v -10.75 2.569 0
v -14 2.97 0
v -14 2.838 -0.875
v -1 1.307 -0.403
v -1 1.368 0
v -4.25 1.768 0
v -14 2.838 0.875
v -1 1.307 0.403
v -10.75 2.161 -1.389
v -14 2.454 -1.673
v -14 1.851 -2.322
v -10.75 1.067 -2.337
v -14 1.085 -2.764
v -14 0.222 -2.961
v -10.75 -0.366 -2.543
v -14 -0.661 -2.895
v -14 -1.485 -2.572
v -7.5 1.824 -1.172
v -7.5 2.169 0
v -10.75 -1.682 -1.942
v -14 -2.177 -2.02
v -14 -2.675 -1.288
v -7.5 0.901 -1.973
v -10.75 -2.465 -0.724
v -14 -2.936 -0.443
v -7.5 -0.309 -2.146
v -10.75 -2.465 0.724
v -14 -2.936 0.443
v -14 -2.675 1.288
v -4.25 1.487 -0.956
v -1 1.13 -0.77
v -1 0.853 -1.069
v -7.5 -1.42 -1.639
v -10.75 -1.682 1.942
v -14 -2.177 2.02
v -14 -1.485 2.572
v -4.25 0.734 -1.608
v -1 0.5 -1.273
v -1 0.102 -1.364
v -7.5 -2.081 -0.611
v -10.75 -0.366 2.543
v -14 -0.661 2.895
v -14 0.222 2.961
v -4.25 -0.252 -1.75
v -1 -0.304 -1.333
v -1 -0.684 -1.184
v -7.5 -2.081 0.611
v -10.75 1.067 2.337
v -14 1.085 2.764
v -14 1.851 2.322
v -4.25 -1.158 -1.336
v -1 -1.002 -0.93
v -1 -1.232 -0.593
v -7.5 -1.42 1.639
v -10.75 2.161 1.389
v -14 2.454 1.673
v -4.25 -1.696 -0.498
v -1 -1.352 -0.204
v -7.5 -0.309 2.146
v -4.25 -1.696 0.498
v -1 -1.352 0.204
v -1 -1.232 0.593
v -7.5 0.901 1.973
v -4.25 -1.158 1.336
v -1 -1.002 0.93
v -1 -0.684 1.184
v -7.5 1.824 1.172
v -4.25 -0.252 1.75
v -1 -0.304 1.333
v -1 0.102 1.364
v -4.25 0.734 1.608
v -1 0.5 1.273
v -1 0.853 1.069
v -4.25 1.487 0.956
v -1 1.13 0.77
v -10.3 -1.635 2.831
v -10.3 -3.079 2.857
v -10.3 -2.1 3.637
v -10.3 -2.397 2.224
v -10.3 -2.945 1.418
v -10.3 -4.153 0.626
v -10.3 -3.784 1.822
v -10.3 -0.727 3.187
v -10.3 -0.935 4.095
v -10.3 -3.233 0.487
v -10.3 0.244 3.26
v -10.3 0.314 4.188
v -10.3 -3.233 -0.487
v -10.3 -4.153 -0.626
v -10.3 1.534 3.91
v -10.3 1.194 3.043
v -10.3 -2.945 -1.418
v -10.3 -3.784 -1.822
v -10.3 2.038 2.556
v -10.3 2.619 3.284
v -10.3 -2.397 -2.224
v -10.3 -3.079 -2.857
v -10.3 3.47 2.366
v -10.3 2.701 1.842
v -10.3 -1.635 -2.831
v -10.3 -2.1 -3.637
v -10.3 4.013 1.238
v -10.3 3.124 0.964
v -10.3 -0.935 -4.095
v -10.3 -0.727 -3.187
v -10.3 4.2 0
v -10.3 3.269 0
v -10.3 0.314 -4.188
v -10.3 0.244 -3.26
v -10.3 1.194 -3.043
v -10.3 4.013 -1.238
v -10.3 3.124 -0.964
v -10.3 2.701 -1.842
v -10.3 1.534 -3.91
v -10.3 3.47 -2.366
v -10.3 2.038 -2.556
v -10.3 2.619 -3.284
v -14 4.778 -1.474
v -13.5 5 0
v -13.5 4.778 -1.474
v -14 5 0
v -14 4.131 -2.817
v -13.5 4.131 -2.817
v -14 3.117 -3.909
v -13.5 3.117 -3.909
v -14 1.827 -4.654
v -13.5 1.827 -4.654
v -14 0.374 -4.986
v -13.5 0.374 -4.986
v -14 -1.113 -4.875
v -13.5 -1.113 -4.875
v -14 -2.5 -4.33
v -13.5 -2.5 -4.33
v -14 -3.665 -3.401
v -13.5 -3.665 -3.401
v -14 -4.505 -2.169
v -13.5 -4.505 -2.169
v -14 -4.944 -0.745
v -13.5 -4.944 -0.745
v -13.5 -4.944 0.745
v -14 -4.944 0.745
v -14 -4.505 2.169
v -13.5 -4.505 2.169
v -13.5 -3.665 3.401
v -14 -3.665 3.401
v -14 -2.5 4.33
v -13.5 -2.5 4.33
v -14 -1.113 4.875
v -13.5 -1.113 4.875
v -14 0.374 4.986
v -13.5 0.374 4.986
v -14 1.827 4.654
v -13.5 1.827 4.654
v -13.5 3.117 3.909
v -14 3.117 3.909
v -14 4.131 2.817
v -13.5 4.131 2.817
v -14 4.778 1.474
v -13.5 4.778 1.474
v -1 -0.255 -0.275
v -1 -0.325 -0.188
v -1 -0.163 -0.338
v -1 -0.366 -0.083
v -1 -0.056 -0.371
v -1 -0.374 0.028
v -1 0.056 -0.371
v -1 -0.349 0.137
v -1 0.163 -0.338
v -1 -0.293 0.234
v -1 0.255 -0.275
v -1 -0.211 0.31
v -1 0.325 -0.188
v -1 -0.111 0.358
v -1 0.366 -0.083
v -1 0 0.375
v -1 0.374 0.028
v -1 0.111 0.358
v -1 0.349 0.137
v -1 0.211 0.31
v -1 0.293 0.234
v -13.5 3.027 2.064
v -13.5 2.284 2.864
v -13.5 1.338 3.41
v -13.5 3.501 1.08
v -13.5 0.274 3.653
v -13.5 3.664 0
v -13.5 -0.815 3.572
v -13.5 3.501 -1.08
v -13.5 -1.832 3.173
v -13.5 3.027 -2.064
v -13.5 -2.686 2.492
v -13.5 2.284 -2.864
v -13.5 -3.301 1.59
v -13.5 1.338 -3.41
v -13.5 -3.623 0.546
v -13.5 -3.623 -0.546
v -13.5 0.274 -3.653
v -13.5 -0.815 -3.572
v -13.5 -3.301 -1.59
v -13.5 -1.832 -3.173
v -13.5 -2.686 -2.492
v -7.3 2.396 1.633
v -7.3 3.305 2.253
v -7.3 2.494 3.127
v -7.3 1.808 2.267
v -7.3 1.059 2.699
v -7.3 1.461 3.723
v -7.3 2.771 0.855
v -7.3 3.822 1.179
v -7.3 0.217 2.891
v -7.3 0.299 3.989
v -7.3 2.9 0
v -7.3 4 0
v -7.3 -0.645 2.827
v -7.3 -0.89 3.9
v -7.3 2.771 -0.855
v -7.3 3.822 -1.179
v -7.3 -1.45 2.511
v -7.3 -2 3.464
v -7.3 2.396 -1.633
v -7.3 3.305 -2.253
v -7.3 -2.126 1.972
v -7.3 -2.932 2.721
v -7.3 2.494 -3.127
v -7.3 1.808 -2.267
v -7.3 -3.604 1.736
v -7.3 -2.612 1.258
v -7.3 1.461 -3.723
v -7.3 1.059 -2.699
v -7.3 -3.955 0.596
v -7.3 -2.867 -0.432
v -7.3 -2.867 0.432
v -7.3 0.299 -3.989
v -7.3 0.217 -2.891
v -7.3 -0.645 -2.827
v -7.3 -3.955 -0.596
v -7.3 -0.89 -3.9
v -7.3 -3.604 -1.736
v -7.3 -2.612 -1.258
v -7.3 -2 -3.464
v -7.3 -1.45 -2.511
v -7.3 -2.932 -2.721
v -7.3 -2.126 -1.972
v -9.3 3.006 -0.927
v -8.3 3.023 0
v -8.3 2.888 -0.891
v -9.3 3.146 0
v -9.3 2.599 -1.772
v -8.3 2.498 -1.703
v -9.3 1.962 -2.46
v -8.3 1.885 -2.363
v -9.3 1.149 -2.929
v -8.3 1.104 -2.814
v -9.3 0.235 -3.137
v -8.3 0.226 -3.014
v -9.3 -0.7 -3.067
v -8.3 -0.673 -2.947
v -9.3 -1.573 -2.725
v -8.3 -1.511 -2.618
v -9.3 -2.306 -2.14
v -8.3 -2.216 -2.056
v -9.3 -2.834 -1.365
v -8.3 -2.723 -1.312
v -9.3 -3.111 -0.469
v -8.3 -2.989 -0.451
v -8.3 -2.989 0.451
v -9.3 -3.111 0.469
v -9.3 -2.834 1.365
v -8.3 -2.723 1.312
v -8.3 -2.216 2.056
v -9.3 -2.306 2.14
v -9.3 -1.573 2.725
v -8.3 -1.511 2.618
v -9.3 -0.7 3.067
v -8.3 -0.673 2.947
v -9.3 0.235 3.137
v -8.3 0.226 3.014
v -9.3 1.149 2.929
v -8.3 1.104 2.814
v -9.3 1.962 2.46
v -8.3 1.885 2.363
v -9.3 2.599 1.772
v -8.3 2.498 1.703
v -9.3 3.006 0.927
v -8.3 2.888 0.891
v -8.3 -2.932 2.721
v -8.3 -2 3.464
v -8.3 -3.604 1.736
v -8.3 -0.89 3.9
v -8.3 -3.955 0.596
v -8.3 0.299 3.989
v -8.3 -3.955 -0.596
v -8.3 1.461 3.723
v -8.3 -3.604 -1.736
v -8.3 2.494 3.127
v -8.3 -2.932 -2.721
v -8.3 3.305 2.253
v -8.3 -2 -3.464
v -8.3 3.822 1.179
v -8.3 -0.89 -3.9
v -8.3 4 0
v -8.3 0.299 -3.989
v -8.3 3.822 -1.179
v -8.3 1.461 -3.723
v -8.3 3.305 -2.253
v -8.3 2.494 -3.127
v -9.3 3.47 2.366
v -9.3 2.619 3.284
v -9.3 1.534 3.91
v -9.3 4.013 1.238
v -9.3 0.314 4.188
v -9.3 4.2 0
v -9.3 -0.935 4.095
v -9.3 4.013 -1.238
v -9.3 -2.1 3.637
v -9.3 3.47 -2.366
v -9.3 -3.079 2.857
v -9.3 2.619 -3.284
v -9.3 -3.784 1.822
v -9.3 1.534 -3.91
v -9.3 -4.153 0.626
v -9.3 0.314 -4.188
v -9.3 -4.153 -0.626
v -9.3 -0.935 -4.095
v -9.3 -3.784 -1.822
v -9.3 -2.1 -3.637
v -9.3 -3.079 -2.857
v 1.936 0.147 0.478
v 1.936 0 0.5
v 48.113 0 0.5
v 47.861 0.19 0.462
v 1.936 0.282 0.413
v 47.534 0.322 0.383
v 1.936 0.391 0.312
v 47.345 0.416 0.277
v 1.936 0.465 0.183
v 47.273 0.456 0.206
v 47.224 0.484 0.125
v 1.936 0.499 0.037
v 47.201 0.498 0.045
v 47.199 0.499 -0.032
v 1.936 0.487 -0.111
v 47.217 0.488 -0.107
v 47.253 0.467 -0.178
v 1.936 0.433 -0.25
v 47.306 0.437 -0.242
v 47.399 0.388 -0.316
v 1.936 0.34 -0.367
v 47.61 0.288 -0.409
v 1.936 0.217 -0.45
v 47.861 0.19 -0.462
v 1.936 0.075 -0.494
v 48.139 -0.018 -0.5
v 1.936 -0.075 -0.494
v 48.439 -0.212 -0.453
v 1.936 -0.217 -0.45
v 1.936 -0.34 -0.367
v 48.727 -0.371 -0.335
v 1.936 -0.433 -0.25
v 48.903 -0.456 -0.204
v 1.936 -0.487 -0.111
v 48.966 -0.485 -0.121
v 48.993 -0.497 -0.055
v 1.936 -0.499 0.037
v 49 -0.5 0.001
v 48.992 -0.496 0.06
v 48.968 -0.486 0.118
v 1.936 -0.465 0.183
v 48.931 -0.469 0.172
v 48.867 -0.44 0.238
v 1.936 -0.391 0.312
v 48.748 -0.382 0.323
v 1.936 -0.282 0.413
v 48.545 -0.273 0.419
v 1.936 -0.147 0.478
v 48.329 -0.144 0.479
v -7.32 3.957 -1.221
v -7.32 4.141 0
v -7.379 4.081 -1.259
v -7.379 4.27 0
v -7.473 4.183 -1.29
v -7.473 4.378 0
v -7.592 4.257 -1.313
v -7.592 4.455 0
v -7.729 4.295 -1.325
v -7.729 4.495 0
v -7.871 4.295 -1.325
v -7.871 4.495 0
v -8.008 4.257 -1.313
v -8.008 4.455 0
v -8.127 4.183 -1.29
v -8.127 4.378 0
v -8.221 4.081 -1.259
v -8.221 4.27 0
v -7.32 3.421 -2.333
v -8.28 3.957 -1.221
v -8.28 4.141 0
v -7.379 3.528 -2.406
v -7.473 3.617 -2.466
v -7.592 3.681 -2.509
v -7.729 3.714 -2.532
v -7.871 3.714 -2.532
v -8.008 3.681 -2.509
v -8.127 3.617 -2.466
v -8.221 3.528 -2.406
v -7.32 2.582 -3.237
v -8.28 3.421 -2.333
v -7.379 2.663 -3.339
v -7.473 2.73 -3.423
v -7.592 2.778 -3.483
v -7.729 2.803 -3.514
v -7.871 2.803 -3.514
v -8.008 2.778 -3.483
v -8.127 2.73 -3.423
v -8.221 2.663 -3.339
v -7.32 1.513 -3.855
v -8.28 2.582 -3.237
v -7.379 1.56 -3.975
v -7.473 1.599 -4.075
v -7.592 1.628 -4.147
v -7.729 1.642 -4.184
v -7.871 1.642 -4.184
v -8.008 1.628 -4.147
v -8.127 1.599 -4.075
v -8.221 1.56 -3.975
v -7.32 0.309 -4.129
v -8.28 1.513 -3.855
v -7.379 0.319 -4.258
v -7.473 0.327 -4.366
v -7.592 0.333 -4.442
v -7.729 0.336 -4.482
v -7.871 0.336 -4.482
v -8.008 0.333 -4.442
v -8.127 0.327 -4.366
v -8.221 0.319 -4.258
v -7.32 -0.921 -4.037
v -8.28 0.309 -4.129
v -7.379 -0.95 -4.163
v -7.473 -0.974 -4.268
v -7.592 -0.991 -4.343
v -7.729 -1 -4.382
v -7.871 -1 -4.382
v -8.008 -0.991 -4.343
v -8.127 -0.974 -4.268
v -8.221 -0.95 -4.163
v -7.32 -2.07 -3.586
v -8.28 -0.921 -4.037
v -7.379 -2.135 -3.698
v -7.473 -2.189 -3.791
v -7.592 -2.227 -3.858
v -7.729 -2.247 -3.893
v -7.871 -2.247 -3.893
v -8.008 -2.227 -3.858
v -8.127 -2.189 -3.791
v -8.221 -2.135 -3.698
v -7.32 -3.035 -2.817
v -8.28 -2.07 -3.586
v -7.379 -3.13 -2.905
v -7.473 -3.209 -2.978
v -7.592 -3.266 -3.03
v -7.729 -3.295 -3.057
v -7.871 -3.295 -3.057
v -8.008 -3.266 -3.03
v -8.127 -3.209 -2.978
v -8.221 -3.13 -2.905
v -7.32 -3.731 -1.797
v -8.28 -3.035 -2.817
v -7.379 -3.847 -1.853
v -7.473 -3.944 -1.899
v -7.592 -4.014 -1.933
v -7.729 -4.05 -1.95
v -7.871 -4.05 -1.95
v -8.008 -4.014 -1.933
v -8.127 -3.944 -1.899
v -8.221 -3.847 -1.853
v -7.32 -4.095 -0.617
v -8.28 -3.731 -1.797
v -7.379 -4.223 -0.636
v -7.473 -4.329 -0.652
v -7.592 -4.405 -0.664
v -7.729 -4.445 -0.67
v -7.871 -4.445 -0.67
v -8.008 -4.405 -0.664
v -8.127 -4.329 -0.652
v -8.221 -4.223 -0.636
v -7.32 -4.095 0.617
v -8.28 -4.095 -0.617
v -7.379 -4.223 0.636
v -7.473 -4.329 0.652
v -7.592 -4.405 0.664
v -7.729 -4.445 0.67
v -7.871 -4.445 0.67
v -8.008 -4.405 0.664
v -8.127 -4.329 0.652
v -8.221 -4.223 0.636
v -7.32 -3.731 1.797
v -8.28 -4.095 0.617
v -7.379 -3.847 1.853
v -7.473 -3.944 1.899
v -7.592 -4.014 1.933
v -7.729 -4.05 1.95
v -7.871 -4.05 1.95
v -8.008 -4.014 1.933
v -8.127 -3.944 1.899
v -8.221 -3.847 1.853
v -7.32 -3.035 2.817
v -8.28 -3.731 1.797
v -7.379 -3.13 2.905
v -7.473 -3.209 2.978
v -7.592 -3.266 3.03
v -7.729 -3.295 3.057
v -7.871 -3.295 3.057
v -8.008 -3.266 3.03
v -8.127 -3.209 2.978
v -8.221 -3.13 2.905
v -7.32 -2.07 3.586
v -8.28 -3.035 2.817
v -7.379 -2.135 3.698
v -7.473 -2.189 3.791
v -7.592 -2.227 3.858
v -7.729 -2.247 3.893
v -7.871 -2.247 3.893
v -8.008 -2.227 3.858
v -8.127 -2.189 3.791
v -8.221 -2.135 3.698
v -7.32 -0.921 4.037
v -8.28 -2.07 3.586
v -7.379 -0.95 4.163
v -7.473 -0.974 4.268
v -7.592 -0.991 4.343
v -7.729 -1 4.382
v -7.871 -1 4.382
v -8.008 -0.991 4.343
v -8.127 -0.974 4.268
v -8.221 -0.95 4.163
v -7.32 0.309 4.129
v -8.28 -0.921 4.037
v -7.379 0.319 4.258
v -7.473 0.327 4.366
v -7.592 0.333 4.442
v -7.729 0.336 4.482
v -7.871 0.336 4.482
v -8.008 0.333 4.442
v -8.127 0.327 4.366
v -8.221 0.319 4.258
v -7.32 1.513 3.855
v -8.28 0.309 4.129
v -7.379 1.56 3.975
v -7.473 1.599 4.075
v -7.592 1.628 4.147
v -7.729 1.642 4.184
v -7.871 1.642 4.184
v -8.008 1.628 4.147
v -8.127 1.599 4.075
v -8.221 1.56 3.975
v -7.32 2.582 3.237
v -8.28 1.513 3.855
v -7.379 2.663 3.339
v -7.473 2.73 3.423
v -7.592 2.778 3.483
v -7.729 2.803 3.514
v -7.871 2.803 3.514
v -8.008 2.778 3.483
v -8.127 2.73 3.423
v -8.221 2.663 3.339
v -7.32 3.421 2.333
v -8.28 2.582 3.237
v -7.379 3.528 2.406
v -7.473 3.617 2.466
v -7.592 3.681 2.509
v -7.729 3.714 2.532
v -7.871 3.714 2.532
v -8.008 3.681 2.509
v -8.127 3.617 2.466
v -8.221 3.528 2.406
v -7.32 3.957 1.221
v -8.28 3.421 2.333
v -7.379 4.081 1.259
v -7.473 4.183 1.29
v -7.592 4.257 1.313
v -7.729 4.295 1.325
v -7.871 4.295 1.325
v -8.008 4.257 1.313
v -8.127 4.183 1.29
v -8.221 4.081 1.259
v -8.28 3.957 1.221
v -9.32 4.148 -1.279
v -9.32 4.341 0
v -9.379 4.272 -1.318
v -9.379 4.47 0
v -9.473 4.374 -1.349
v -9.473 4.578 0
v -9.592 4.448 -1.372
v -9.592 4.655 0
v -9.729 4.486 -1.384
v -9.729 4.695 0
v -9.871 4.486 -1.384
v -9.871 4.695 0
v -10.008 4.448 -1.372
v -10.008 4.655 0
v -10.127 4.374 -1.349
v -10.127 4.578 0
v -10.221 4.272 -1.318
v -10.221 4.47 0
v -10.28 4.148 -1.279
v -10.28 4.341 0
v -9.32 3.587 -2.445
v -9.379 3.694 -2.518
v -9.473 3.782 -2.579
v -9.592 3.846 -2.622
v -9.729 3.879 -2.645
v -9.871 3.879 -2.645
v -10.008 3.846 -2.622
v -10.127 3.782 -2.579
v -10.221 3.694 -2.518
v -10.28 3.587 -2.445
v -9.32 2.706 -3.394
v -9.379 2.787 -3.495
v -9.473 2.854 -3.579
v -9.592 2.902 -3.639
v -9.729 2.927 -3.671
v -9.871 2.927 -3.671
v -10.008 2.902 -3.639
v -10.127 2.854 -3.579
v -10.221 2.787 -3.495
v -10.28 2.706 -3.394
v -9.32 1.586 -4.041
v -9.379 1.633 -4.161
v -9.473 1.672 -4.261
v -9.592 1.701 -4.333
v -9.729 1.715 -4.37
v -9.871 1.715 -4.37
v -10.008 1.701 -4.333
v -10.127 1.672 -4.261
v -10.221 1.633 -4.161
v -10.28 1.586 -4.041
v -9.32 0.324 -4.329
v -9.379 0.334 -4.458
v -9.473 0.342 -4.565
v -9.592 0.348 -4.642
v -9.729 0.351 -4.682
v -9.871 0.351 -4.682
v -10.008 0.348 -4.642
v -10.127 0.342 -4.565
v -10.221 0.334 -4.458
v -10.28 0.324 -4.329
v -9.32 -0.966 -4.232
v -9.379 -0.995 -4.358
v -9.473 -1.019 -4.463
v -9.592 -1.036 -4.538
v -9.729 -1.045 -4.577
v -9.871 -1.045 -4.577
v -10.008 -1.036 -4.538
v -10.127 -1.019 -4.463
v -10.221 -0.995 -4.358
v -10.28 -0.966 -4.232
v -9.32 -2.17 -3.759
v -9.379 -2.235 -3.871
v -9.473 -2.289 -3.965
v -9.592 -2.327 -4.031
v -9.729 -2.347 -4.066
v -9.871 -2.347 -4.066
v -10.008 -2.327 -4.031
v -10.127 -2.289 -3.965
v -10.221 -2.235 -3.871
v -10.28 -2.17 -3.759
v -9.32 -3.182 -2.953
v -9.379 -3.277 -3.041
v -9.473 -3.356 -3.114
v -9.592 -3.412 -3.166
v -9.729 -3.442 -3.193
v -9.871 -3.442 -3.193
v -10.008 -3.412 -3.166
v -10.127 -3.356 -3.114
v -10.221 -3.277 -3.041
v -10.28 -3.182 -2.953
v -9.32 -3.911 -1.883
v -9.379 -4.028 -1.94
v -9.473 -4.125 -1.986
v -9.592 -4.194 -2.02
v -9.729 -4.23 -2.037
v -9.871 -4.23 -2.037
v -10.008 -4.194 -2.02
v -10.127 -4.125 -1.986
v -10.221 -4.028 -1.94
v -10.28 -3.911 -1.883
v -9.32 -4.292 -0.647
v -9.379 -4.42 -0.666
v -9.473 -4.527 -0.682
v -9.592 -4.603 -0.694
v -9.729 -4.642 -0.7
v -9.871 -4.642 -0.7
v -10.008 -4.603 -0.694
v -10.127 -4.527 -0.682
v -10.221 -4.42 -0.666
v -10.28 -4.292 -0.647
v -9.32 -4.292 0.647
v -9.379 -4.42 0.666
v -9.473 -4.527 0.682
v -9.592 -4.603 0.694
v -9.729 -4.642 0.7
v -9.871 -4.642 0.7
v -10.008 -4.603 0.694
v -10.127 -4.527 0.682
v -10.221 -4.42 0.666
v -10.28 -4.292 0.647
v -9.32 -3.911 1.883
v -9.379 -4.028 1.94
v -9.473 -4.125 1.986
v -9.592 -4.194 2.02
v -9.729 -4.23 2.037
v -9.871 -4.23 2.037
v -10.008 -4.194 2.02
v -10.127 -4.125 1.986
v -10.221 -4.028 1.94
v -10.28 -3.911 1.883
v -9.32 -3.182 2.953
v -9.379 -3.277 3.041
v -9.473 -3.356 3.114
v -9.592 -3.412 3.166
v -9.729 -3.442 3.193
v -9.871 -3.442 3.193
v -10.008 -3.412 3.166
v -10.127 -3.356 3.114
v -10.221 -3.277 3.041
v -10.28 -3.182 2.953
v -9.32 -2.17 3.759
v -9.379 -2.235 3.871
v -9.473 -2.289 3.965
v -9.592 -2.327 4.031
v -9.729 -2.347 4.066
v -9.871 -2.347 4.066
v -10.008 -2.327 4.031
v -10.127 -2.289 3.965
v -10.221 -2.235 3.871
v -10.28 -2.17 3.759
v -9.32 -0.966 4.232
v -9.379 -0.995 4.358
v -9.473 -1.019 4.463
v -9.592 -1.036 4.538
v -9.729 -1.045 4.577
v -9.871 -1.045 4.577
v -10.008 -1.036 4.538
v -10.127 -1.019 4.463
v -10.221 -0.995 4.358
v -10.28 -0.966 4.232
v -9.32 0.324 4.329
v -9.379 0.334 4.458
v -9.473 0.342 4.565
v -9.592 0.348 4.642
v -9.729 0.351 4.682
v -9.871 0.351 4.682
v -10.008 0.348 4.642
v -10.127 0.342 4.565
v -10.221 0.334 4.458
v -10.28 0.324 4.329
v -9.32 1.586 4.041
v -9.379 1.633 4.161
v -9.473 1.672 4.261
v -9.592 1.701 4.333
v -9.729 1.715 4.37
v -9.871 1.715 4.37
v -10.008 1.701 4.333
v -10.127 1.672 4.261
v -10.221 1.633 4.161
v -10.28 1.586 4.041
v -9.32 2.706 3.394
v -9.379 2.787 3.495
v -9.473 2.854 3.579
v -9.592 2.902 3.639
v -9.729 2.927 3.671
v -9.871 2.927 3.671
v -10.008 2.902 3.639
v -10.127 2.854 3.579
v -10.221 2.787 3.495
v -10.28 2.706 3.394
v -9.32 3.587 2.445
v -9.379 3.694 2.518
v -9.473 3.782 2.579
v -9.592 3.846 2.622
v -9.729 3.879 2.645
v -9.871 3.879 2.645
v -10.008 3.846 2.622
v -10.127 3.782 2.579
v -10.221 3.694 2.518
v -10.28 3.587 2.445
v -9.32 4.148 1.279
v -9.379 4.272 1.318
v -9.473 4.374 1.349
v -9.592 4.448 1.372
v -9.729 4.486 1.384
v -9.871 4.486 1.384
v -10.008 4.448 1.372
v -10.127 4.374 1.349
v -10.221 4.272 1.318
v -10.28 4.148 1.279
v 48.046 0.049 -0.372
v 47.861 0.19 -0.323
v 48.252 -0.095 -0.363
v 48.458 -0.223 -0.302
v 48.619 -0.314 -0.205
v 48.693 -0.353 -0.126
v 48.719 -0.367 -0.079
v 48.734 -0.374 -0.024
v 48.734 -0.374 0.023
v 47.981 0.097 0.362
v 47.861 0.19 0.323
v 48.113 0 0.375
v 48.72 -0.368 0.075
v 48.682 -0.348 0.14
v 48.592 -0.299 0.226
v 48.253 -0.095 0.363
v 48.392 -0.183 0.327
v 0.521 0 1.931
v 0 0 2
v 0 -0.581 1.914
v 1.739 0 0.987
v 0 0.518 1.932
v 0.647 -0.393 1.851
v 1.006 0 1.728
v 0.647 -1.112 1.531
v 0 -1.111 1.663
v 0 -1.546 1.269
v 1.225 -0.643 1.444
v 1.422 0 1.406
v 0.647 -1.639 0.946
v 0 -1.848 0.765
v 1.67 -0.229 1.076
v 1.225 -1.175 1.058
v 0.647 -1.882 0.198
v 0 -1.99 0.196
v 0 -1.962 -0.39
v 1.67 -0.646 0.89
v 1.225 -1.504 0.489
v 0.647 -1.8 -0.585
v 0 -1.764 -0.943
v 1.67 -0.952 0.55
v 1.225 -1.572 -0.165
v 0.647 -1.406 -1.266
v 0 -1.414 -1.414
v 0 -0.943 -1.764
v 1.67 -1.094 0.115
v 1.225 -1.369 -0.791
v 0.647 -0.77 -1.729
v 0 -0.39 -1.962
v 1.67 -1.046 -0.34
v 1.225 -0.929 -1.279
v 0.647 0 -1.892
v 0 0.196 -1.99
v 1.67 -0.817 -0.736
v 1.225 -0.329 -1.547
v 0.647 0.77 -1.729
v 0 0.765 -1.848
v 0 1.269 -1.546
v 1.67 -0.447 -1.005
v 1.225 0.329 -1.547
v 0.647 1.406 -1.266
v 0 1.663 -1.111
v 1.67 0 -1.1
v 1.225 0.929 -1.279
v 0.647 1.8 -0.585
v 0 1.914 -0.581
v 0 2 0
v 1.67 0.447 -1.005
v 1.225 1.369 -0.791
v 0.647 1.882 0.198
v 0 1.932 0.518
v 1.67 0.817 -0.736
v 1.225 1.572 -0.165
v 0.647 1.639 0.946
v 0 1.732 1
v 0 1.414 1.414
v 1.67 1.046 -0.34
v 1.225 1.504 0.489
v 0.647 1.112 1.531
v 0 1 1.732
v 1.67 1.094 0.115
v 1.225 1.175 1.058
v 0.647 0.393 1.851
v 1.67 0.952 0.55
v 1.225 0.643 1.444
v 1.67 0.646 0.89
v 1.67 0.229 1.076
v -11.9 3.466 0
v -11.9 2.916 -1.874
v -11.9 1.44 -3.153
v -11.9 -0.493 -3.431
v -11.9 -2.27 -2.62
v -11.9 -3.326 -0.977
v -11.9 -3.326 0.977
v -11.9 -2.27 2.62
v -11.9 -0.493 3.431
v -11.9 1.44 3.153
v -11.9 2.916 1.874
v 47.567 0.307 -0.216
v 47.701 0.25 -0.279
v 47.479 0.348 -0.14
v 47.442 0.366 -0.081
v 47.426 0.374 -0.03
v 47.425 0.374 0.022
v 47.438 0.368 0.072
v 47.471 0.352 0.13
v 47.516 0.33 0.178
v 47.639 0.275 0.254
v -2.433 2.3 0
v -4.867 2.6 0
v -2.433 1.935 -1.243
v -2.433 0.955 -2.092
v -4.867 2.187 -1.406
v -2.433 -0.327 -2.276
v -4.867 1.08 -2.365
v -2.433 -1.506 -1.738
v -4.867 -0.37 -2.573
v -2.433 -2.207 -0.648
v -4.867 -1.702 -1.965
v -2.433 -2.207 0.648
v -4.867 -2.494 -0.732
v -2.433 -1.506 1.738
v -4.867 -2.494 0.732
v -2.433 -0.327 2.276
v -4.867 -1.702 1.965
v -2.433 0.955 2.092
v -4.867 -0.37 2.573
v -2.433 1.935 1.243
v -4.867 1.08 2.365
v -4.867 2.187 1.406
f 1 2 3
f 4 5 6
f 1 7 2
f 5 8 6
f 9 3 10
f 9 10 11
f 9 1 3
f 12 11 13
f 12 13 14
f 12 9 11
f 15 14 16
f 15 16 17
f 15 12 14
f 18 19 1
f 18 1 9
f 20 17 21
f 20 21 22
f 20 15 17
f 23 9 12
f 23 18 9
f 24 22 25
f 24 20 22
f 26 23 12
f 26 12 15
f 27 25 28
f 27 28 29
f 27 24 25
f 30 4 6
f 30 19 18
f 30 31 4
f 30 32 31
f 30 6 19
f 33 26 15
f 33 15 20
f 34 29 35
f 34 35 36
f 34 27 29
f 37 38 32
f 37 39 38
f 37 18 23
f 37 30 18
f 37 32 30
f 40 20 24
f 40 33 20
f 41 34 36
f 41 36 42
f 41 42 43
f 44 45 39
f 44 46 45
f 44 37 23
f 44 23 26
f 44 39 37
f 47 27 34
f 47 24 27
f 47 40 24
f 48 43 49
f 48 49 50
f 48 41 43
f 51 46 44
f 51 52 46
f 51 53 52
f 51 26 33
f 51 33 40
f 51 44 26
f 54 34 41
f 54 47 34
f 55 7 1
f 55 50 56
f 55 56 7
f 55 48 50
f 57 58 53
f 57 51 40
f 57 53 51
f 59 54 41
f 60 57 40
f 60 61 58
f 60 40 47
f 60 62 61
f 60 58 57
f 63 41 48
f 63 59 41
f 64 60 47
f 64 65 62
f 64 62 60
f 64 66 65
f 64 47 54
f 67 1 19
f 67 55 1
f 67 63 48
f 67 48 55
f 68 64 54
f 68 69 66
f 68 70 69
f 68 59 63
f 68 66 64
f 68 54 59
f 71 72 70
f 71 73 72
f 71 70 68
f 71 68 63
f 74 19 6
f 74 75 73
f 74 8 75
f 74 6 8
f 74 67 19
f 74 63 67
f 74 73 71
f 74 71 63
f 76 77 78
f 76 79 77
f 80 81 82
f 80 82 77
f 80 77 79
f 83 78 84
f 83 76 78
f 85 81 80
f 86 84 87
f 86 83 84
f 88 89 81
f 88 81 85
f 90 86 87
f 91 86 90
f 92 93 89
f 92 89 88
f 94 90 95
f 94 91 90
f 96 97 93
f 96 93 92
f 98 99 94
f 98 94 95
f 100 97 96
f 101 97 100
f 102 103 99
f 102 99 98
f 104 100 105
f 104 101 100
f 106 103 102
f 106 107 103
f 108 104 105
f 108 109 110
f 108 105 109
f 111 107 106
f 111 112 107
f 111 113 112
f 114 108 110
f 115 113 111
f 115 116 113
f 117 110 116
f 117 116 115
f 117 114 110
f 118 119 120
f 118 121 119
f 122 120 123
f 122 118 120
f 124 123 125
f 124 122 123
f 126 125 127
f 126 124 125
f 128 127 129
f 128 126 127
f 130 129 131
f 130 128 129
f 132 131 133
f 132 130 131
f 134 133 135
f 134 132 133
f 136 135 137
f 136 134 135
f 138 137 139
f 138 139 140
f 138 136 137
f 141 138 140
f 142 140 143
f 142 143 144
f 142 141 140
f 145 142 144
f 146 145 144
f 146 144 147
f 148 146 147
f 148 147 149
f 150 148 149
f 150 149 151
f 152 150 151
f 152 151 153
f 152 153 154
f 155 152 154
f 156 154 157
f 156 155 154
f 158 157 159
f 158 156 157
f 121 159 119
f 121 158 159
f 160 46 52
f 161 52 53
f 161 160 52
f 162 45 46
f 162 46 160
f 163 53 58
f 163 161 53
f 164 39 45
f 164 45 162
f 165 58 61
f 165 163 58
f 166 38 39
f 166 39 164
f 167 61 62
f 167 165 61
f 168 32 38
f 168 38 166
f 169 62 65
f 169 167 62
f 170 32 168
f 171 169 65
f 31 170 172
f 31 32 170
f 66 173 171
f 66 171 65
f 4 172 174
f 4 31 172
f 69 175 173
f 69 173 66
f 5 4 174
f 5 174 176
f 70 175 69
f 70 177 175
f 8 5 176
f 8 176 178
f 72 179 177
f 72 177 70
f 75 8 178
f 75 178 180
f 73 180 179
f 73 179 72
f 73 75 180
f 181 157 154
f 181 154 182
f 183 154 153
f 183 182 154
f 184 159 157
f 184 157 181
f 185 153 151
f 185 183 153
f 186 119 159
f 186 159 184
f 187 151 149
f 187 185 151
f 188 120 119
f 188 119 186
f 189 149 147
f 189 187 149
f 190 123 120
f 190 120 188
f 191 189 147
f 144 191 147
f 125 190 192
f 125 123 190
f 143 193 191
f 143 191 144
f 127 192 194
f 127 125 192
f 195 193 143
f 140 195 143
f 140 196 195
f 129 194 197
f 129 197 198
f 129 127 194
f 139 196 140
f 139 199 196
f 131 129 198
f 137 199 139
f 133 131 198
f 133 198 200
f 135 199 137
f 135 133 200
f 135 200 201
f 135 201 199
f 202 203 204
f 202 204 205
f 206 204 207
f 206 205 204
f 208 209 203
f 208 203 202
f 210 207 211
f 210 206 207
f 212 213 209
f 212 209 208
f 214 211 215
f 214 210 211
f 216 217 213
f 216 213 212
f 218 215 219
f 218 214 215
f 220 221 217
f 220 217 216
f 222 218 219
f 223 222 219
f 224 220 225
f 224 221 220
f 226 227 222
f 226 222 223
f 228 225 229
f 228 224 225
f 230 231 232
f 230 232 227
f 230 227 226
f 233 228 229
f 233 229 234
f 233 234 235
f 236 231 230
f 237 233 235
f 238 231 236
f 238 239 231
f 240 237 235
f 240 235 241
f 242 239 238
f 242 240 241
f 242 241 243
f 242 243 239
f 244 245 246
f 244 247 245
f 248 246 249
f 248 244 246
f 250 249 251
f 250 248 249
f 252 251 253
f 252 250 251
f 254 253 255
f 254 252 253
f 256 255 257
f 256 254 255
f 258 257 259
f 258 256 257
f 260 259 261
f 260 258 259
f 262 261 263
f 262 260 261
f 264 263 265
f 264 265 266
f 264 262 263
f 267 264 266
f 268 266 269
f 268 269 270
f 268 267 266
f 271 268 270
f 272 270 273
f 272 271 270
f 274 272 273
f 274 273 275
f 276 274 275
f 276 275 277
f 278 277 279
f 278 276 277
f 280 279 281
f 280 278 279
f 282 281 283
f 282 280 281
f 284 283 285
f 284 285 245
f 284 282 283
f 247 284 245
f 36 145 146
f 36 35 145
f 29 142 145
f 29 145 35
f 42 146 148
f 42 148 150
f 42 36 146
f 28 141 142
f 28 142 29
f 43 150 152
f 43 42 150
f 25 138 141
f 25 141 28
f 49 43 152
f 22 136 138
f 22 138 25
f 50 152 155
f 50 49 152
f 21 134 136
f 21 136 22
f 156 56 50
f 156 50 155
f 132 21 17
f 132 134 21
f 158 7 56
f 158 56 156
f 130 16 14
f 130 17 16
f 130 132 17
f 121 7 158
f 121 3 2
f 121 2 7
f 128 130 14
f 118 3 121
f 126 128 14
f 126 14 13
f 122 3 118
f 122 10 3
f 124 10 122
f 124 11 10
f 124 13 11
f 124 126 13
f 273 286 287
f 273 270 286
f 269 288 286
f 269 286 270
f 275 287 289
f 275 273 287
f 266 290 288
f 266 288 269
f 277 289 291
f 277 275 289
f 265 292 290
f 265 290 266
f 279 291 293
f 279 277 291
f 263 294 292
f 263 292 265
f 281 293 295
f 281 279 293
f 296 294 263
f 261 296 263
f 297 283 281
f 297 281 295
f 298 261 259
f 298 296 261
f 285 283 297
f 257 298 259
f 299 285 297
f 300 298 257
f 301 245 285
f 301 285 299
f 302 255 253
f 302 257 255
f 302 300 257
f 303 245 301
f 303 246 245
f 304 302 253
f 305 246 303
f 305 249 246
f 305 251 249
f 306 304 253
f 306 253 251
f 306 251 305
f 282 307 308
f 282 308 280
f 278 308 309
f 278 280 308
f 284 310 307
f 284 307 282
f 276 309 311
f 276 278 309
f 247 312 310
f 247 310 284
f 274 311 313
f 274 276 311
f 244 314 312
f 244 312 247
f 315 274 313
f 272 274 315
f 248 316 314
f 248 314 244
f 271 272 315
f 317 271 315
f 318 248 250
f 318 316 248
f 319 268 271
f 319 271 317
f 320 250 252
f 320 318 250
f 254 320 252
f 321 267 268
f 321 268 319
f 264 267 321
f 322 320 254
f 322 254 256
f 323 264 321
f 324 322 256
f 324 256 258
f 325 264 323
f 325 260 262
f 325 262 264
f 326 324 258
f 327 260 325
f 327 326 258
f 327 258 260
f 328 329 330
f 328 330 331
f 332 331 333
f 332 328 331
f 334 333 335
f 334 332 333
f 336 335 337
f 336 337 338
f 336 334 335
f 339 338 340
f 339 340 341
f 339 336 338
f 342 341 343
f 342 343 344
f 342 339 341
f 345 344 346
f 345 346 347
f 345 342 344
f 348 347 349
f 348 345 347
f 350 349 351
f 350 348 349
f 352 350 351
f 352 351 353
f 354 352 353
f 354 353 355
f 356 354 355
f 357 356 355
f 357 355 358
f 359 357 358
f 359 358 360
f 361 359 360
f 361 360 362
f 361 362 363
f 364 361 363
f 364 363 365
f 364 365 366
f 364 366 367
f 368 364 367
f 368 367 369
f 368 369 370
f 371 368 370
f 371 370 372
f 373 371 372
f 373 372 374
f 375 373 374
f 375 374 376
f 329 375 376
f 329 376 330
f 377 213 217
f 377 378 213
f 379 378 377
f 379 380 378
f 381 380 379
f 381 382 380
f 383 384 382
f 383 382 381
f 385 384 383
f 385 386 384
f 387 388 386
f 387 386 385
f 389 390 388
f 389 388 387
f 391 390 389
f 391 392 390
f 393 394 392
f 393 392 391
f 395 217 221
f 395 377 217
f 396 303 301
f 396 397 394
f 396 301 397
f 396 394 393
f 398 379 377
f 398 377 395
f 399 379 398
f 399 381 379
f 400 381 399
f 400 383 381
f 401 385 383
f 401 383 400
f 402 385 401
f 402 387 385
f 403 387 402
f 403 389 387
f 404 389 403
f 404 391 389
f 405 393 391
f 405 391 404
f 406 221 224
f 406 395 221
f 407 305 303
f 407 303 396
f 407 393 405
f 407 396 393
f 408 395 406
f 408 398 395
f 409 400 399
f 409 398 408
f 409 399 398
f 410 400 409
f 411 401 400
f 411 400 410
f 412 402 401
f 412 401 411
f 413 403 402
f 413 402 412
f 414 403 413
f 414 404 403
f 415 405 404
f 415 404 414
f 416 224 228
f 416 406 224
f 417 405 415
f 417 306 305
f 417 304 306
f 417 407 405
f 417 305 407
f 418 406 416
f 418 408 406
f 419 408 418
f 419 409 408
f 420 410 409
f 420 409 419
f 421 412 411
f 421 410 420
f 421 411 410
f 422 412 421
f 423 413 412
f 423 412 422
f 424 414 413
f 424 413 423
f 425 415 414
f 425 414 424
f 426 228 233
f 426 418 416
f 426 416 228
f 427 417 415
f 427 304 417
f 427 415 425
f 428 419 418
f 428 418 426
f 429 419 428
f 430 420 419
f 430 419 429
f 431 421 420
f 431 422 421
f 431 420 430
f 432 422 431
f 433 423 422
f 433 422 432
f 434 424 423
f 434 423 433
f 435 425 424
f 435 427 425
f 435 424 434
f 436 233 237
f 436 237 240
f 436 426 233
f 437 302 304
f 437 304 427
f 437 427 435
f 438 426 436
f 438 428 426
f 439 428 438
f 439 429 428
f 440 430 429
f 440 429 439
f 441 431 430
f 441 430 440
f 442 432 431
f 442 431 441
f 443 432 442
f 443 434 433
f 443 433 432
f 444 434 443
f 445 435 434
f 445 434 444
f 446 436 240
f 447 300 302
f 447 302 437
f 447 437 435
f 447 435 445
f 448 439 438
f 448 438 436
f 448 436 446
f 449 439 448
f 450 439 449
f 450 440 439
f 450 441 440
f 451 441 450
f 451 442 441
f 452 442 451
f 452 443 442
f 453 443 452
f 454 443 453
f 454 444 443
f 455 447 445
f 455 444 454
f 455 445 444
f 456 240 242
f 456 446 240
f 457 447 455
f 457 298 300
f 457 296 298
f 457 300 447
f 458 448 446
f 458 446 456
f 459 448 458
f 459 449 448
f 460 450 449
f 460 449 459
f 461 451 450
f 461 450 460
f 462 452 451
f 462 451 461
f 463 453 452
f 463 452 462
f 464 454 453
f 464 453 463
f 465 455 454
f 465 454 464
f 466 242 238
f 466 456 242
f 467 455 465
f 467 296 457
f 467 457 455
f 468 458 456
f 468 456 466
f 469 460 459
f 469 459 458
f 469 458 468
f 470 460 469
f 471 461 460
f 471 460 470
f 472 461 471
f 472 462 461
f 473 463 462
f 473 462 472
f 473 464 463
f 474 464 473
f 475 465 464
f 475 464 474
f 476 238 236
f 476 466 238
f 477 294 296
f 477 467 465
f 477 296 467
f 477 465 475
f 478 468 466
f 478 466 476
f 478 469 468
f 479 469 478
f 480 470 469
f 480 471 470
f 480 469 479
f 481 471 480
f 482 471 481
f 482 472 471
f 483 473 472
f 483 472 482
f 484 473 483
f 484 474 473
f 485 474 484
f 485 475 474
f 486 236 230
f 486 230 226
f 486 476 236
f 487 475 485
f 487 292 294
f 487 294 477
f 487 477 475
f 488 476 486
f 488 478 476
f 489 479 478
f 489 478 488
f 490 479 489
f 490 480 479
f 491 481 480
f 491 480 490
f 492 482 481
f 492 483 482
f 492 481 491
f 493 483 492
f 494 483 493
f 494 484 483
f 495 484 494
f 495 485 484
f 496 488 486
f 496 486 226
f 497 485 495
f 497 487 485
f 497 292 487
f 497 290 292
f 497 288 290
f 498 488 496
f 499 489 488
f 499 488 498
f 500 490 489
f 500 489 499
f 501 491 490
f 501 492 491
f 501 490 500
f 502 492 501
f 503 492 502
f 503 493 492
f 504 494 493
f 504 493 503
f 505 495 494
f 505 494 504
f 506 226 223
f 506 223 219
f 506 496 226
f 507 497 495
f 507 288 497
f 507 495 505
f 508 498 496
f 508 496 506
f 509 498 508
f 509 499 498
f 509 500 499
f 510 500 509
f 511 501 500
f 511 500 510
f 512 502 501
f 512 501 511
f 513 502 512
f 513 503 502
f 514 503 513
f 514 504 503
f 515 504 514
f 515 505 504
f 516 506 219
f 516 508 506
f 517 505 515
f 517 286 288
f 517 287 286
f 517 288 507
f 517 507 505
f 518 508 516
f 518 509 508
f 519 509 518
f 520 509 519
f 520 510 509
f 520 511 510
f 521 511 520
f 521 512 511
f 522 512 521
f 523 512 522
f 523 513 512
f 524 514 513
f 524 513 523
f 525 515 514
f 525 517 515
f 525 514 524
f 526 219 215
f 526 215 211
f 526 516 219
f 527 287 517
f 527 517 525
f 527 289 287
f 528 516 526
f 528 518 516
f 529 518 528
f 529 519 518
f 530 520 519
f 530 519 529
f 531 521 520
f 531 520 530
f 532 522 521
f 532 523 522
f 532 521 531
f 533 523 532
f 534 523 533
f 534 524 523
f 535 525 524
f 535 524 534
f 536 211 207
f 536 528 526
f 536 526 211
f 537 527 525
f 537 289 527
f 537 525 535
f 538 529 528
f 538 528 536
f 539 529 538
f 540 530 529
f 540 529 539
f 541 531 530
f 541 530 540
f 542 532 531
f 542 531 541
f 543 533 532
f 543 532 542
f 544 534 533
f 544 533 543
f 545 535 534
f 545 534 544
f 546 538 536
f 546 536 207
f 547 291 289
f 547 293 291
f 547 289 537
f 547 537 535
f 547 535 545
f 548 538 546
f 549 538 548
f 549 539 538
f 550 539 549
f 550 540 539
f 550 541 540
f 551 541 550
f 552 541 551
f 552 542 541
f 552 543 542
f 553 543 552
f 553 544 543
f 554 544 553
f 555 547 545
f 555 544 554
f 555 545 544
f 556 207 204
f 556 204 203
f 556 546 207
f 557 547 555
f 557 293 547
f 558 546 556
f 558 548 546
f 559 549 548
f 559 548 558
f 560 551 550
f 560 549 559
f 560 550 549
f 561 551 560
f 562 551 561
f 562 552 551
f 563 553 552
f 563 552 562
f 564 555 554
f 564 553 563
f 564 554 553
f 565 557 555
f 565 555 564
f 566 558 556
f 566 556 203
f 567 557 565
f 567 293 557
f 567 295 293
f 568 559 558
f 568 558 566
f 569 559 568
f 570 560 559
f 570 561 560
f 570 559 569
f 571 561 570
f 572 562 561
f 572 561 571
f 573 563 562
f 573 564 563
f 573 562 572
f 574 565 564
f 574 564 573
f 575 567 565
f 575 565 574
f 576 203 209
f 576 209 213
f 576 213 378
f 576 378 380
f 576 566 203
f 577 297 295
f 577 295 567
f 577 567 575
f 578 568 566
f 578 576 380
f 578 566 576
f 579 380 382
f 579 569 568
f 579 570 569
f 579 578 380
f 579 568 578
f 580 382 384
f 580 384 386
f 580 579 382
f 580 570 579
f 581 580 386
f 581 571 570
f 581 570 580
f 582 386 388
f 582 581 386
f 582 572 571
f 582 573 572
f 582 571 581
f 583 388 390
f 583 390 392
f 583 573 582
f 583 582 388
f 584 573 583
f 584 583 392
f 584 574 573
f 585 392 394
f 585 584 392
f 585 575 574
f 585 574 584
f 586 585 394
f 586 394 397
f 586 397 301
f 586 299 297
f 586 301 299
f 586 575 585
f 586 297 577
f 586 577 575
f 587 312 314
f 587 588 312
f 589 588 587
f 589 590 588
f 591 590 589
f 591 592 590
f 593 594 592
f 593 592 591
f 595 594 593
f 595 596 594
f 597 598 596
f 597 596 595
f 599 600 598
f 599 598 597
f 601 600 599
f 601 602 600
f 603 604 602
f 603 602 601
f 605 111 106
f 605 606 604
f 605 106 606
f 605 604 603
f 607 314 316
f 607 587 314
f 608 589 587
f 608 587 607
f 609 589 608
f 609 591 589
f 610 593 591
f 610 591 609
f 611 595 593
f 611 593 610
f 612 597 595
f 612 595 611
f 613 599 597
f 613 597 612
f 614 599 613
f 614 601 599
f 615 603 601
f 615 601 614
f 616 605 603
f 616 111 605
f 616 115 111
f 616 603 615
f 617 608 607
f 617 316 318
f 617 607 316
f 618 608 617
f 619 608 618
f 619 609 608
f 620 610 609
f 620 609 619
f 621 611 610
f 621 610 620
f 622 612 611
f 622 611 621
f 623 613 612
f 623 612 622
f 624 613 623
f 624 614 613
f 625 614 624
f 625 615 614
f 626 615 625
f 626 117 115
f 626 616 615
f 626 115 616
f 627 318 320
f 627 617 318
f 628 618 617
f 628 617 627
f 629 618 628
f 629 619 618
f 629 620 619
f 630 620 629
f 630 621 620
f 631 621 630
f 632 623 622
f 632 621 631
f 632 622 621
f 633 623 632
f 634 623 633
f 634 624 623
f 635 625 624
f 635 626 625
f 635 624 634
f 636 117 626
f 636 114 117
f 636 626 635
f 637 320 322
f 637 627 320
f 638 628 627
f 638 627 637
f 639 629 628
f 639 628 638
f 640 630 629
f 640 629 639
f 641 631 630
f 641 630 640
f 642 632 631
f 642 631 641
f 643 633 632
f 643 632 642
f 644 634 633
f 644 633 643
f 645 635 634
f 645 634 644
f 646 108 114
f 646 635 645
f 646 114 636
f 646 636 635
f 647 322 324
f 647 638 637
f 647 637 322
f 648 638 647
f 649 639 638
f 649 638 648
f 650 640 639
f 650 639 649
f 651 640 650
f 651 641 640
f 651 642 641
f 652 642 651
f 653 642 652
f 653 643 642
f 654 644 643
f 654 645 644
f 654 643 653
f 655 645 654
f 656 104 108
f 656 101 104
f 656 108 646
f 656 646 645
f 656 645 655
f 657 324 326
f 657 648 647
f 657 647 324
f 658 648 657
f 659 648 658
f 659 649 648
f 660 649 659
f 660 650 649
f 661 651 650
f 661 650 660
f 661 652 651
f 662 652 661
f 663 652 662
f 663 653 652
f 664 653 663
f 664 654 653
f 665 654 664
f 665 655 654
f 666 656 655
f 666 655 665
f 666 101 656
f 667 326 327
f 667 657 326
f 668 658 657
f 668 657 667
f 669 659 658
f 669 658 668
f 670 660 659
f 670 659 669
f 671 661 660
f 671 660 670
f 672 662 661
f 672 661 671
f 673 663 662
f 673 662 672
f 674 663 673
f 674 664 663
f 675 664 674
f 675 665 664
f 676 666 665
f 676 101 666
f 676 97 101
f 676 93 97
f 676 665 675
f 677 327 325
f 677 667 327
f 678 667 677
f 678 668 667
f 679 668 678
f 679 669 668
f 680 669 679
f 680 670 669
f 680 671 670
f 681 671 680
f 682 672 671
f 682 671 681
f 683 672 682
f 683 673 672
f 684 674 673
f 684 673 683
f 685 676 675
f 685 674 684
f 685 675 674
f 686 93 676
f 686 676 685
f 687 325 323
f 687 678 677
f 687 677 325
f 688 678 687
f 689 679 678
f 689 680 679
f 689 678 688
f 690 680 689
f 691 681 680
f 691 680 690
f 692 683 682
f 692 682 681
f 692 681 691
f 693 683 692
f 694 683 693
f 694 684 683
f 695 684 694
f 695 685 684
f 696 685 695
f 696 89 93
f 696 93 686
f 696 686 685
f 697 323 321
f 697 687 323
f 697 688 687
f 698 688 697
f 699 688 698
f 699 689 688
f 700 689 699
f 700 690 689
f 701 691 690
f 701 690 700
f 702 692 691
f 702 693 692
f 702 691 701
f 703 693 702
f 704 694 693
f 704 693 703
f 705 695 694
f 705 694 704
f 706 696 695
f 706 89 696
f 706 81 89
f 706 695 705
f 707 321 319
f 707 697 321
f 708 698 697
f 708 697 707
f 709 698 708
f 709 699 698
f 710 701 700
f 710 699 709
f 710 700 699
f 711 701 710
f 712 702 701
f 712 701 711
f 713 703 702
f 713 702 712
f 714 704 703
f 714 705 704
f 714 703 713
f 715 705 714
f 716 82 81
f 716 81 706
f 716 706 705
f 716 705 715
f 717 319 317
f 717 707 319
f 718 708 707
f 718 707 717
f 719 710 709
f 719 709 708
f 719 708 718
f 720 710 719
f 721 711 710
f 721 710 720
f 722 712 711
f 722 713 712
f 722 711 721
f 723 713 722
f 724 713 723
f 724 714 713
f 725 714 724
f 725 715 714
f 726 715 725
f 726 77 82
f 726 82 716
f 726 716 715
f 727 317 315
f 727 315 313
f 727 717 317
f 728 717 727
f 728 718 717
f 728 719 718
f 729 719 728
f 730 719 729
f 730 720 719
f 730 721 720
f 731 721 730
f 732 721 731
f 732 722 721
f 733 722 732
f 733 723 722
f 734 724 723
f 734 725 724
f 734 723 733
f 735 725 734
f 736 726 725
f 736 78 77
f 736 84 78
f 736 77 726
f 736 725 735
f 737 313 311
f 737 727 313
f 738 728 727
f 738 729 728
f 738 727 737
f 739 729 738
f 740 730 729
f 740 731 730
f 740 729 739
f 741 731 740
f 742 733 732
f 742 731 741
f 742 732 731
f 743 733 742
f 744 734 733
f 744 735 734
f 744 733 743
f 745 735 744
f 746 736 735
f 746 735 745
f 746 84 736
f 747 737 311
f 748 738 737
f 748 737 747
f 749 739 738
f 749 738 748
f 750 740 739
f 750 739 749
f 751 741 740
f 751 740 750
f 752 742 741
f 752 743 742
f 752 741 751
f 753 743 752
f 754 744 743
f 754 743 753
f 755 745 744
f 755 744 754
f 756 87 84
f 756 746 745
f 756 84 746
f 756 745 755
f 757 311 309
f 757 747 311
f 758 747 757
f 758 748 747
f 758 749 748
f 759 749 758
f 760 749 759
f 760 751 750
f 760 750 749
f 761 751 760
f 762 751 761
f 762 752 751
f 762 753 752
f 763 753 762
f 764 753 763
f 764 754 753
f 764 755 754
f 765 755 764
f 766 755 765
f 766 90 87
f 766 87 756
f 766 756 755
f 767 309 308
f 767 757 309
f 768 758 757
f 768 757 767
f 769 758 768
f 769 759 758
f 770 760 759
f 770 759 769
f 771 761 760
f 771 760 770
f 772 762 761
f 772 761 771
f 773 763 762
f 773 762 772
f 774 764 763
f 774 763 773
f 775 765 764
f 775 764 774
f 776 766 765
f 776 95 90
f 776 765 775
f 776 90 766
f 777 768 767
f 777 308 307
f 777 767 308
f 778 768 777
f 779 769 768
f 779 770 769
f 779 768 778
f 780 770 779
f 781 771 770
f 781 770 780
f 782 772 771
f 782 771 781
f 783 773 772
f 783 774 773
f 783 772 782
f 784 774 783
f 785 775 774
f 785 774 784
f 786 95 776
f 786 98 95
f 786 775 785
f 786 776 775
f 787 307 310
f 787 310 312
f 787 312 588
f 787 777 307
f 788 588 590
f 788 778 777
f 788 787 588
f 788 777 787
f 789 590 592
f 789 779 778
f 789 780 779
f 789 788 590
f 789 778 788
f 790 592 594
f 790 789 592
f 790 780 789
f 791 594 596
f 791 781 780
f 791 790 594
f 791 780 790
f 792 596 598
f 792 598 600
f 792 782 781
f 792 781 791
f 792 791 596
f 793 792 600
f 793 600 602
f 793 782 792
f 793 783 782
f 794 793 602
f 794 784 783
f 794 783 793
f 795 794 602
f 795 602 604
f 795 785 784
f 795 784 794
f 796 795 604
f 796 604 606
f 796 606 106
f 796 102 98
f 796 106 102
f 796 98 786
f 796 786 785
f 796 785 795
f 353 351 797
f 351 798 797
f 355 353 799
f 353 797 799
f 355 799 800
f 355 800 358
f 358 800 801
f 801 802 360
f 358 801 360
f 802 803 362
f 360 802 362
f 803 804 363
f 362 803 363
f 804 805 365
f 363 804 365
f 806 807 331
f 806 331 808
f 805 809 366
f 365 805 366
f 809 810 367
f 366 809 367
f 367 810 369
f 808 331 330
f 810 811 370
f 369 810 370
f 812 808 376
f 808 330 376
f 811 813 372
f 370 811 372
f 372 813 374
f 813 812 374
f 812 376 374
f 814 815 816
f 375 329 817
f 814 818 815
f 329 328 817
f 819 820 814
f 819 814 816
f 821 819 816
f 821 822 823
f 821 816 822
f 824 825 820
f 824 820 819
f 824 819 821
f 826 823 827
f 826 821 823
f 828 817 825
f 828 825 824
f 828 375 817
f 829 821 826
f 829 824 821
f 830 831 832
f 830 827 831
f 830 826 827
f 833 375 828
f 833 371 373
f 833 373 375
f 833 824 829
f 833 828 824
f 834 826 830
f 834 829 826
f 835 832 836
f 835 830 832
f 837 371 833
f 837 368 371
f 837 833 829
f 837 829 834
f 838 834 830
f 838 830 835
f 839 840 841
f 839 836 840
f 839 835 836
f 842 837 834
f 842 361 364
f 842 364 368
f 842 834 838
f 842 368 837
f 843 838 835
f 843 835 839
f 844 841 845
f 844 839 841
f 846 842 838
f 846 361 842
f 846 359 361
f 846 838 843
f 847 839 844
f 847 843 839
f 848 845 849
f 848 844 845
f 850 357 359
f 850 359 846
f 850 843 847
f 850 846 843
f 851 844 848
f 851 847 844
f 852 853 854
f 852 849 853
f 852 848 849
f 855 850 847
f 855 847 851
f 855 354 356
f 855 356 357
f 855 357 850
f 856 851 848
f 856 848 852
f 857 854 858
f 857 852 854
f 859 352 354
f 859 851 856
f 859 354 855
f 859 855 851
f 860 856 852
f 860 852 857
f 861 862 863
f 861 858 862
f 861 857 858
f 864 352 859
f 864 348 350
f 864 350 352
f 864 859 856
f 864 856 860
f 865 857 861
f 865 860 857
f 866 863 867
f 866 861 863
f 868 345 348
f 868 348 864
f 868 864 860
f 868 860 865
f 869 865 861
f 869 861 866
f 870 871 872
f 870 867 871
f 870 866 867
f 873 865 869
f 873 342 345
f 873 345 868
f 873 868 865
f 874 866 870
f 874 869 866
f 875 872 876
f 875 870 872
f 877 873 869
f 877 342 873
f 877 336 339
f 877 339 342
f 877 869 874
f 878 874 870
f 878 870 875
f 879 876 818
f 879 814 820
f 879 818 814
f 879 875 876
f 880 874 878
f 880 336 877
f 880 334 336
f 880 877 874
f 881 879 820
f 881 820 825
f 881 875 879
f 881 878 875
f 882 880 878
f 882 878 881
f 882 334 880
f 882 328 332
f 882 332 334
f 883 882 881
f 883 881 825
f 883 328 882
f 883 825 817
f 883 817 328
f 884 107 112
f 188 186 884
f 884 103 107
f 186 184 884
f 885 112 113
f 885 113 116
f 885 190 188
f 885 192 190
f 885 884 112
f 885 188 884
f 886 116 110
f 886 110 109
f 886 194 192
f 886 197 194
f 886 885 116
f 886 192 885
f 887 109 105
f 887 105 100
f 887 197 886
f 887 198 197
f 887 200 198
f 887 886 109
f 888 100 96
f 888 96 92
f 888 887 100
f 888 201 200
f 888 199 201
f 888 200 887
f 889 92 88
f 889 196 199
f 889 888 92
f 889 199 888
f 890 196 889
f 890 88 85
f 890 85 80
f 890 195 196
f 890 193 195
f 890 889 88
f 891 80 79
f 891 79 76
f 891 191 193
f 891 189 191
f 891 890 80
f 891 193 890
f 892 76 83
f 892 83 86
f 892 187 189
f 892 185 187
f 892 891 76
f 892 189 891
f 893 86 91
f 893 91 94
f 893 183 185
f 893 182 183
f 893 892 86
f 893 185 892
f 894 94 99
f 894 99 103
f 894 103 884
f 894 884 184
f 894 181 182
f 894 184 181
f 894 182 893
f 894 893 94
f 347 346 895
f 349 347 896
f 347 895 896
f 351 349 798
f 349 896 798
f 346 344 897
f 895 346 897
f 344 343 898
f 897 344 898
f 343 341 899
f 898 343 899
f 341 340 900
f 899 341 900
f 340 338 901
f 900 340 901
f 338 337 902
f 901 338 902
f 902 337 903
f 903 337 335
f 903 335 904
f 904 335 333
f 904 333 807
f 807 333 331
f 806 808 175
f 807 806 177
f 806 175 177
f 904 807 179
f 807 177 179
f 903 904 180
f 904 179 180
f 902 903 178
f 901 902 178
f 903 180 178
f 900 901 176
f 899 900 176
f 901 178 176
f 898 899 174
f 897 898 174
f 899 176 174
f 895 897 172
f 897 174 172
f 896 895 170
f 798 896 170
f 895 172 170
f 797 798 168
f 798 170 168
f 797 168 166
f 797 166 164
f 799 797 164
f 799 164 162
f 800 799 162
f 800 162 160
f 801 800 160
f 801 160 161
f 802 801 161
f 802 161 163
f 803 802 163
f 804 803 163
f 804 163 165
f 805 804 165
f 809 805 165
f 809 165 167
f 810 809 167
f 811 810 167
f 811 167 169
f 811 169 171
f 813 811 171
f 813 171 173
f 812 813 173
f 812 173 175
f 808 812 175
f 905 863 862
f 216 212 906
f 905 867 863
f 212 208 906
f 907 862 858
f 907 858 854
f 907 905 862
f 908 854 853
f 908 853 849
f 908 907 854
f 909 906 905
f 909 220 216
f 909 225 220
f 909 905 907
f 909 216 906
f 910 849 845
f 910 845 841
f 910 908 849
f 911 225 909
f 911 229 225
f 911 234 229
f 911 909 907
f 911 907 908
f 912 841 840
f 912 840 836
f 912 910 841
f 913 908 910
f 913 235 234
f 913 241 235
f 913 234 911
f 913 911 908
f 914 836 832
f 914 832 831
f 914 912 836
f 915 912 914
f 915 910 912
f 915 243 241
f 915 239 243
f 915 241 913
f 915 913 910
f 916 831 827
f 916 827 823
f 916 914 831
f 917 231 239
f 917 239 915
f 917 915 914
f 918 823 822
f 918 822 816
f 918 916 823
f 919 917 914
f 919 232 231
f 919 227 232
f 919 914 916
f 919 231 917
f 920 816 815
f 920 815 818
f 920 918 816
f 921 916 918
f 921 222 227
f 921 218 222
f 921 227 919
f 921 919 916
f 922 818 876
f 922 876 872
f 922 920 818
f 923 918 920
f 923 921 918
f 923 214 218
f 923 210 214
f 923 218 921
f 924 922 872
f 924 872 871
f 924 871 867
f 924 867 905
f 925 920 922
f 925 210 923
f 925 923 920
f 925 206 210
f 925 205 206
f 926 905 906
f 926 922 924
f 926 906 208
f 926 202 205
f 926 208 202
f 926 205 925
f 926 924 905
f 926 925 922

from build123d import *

# Parameters (mm, degrees)
DOME1_FACE_RADIUS   = 2
DOME1_HEIGHT        = 2
SKETCH2_R           = 0.5
CUT_EXTRUDE1_DEPTH  = 4
SKETCH3_R           = 0.5
SKETCH3_R_2         = 0.375
EXTRUDE_THIN1_DEPTH = 50
SKETCH4_R           = 3.5
CUT_EXTRUDE2_DEPTH  = 5
SKETCH5_R           = 5
CUT_EXTRUDE3_DEPTH  = 5


with BuildPart() as part:
    # Sketch1 → Revolve1 (revolve)
    with BuildSketch(Plane.XY):
        with BuildLine():
            Line((0, 0), (0, 2))
            Line((0, 2), (-7.3, 2.899560699))
            Line((-7.3, 2.899560699), (-7.3, 4))
            ThreePointArc((-7.3, 4), (-7.8, 4.5), (-8.3, 4))
            Line((-8.3, 4), (-8.3, 3.022788192))
            Line((-8.3, 3.022788192), (-9.3, 3.146015685))
            Line((-9.3, 3.146015685), (-9.3, 4.2))
            ThreePointArc((-9.3, 4.2), (-9.8, 4.7), (-10.3, 4.2))
            Line((-10.3, 4.2), (-10.3, 3.269243178))
            Line((-10.3, 3.269243178), (-13.5, 3.663571155))
            Line((-13.5, 3.663571155), (-13.5, 5))
            Line((-13.5, 5), (-14, 5))
            Line((-14, 5), (-14, 2.969511976))
            Line((-14, 2.969511976), (-1, 1.367554567))
            Line((-1, 1.367554567), (-1, 0))
            Line((-1, 0), (0, 0))
        make_face()
    revolve(axis=Axis((0, 0, 0), (-1, 0, 0)))

    # Dome1: a dome of height H over a round flat face of radius A is a cap of a sphere of radius (A * A + H * H) / (2 * H)
    dome1_r = (DOME1_FACE_RADIUS * DOME1_FACE_RADIUS + DOME1_HEIGHT * DOME1_HEIGHT) / (2 * DOME1_HEIGHT)
    dome1_base = Plane((0, 0, 0), z_dir=(1, 0, 0))
    with Locations(dome1_base.offset(DOME1_HEIGHT - dome1_r)):
        dome1_ball = Sphere(dome1_r, mode=Mode.PRIVATE)
    add(split(dome1_ball, bisect_by=dome1_base, keep=Keep.TOP, mode=Mode.PRIVATE))

    # Sketch2 → Cut-Extrude1 (cut)
    with BuildSketch(Plane.ZY.offset(1)):
        Circle(SKETCH2_R)
    extrude(amount=-CUT_EXTRUDE1_DEPTH, mode=Mode.SUBTRACT)

    # Sketch3 → Extrude-Thin1 (add)
    with BuildSketch(Plane.ZY.offset(1)):
        Circle(SKETCH3_R)
        Circle(SKETCH3_R_2, mode=Mode.SUBTRACT)
    extrude(amount=-EXTRUDE_THIN1_DEPTH)

    # Sketch4 → Cut-Extrude2 (cut, symmetric)
    with BuildSketch(Plane.XY):
        with Locations((49, 3.5)):
            Circle(SKETCH4_R)
    extrude(amount=CUT_EXTRUDE2_DEPTH, both=True, mode=Mode.SUBTRACT)

    # Sketch5 → Cut-Extrude3 (cut, symmetric)
    with BuildSketch(Plane.XY):
        with Locations((51, 4.082575695)):
            Circle(SKETCH5_R)
    extrude(amount=CUT_EXTRUDE3_DEPTH, both=True, mode=Mode.SUBTRACT)


solid = part.part
